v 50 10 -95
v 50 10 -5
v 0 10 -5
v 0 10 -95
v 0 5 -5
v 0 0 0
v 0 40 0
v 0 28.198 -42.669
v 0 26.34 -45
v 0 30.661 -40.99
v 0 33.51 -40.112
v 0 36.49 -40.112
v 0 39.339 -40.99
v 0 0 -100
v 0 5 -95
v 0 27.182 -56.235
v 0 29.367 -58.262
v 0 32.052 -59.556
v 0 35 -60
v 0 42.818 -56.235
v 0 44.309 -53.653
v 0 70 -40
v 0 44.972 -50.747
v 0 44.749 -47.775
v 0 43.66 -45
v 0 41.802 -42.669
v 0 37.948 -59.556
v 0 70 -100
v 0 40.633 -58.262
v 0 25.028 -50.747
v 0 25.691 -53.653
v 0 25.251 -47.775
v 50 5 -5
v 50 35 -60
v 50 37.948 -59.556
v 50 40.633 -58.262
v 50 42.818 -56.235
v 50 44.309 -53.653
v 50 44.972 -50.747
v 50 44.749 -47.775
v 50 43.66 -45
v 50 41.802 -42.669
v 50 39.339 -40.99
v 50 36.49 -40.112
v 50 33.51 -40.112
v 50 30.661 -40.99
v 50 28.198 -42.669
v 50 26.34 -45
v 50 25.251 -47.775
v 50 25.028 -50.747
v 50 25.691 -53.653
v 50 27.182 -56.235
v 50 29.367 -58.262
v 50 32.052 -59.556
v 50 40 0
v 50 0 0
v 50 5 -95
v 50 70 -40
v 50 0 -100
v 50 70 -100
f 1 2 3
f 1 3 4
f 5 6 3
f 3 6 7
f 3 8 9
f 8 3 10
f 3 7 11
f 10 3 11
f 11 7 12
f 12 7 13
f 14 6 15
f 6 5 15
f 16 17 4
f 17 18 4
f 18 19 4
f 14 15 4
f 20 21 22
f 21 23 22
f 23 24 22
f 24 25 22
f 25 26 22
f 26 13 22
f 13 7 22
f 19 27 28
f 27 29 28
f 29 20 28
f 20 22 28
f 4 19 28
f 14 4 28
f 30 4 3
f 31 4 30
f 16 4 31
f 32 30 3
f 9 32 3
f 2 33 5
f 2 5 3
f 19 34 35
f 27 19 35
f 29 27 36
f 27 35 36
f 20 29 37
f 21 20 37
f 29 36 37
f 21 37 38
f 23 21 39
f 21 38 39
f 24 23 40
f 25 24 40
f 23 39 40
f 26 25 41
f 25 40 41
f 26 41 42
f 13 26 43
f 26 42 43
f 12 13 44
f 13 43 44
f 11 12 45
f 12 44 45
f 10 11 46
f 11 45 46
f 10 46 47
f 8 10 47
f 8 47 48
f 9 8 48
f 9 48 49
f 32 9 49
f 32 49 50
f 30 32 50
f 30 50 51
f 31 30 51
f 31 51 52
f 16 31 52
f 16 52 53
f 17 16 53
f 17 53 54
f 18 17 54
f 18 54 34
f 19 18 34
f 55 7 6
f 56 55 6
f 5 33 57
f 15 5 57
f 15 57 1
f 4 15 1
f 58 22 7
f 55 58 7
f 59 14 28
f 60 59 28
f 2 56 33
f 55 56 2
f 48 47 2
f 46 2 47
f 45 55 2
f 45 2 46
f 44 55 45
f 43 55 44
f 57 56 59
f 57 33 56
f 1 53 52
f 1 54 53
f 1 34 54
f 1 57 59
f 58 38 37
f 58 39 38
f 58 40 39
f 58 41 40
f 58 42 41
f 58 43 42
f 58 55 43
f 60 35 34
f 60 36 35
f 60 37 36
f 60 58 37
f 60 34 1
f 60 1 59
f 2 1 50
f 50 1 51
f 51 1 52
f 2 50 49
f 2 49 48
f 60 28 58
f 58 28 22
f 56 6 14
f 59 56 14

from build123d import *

# Parameters (mm, degrees)
BOSS_EXTRUDE1_DEPTH = 50
SKETCH2_R           = 10
CUT_EXTRUDE1_DEPTH  = 51
SKETCH3_W           = 90
SKETCH3_H           = 5
CUT_EXTRUDE2_DEPTH  = 51


with BuildPart() as part:
    # Sketch1 → Boss-Extrude1 (new body)
    with BuildSketch(Plane(origin=(0, 0, 0), x_dir=(0, 0, -1), z_dir=(1, 0, 0))):
        Polygon((40, 70), (0, 40), (0, 0), (100, 0), (100, 70), align=None)
    extrude(amount=BOSS_EXTRUDE1_DEPTH)

    # Sketch2 → Cut-Extrude1 (cut, through all)
    with BuildSketch(Plane(origin=(50, 0, 0), x_dir=(0, 0, -1), z_dir=(1, 0, 0))):
        with Locations((50, 35)):
            Circle(SKETCH2_R)
    extrude(amount=-CUT_EXTRUDE1_DEPTH, mode=Mode.SUBTRACT)

    # Sketch3 → Cut-Extrude2 (cut, through all)
    with BuildSketch(Plane(origin=(50, 0, 0), x_dir=(0, 0, -1), z_dir=(1, 0, 0))):
        with Locations((50, 7.5)):
            Rectangle(SKETCH3_W, SKETCH3_H)
    extrude(amount=-CUT_EXTRUDE2_DEPTH, mode=Mode.SUBTRACT)


solid = part.part
